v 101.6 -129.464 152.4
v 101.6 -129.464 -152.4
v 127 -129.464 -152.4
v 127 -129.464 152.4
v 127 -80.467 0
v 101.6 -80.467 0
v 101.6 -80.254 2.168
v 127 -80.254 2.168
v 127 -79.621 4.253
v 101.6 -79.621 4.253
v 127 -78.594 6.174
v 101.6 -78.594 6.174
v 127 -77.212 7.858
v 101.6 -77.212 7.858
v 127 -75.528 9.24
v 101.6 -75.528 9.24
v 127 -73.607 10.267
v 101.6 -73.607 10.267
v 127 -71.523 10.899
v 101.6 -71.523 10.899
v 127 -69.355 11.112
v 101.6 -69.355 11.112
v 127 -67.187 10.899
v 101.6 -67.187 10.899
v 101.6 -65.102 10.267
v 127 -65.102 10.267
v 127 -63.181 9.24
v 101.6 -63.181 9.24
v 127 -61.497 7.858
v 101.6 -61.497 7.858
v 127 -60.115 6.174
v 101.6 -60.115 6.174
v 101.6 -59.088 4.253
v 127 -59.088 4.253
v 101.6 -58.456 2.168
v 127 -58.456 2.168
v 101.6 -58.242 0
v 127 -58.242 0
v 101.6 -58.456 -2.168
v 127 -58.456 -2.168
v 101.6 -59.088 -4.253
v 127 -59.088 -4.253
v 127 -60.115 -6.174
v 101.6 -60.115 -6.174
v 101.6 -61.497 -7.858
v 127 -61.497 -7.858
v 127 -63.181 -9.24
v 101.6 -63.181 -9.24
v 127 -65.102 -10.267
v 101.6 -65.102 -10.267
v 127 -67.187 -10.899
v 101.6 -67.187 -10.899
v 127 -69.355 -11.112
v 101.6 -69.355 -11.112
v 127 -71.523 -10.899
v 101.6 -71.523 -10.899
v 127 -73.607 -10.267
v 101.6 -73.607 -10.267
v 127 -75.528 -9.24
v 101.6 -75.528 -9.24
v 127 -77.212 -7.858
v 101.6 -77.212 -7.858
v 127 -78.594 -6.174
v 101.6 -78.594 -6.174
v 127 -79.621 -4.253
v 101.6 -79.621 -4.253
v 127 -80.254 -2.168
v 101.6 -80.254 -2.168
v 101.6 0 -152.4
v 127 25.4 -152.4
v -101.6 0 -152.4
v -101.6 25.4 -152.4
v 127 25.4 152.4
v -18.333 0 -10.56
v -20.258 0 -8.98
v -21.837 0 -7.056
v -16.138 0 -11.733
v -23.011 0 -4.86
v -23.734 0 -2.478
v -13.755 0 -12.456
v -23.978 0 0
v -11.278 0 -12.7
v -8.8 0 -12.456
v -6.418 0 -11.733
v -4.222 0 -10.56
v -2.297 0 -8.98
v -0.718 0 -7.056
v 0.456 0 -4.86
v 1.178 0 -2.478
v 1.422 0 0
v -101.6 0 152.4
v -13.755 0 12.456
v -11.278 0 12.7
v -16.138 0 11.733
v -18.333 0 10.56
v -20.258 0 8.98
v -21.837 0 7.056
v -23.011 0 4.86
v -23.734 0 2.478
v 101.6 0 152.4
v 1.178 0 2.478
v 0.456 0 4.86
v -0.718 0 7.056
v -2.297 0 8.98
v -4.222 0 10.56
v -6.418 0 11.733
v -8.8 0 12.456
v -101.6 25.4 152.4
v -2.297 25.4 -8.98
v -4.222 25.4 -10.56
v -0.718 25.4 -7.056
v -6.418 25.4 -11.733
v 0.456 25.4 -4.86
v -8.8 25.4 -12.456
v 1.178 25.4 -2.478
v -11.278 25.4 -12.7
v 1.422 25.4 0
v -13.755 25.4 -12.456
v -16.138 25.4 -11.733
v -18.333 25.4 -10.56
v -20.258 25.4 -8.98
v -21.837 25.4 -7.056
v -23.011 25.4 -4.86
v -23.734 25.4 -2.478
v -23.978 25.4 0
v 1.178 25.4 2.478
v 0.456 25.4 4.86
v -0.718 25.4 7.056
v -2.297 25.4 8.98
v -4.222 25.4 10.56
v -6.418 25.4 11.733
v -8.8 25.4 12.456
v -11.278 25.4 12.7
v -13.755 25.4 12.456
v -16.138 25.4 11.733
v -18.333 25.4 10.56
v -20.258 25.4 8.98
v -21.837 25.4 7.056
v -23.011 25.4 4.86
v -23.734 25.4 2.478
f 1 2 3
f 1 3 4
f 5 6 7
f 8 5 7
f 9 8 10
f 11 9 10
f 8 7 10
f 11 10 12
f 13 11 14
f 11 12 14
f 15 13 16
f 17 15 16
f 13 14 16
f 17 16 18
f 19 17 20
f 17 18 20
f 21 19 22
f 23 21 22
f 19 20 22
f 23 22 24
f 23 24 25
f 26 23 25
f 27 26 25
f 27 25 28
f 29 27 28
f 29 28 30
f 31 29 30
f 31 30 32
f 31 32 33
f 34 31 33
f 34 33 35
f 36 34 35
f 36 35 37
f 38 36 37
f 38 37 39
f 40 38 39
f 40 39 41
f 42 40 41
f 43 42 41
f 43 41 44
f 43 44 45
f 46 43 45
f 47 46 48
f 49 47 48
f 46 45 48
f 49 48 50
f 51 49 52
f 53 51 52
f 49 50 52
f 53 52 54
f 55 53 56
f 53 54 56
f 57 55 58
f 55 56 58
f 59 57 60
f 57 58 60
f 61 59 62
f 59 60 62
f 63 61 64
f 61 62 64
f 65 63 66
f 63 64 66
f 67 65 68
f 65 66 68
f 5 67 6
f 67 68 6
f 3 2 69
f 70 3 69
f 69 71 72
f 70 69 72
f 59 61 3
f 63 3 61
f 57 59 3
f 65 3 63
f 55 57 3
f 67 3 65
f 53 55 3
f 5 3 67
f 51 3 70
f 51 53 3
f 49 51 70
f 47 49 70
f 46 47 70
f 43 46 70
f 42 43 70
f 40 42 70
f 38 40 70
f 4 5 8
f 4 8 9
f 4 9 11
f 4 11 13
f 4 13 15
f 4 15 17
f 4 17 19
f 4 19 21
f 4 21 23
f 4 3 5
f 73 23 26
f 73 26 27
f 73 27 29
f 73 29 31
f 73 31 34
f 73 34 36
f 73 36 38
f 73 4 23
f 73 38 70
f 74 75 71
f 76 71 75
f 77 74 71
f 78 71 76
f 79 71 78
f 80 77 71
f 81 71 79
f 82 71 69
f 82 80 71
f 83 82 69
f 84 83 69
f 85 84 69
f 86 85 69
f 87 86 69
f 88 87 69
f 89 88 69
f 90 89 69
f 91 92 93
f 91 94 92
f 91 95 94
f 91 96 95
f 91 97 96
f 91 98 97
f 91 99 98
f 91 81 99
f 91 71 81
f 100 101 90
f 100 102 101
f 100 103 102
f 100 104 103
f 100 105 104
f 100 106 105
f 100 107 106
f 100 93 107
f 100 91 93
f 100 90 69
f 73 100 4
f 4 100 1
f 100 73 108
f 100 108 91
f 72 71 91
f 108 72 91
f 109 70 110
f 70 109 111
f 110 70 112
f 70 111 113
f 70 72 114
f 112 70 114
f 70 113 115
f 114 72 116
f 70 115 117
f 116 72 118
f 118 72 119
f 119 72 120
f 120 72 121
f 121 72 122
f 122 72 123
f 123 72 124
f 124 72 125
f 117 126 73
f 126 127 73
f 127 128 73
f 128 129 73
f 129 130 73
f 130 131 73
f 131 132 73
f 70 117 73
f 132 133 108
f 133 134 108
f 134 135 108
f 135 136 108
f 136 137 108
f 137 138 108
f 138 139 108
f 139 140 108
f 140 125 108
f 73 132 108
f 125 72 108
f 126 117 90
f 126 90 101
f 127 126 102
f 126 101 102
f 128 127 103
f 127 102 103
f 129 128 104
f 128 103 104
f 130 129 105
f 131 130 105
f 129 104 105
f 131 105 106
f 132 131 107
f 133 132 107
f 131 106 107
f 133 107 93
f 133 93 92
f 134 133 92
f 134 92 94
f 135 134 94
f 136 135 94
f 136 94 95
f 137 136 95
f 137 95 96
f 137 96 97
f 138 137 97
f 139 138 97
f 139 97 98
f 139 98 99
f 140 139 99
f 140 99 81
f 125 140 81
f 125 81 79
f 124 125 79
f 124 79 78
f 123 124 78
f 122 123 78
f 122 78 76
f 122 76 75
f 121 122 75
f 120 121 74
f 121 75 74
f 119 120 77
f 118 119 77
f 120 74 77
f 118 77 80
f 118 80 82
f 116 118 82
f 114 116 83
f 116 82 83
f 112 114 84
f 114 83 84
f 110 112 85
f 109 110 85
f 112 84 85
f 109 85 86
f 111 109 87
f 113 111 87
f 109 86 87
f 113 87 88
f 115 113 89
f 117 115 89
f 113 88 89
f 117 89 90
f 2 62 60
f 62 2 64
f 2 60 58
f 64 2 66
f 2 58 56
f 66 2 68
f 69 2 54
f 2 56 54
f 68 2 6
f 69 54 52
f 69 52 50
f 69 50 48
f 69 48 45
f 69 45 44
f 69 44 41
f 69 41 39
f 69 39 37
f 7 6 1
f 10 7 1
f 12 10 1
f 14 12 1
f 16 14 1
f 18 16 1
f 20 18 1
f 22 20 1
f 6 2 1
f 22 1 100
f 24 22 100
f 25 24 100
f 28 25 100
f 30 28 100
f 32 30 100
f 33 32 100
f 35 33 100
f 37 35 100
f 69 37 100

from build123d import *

# Parameters (mm, degrees)
F0_W     = 203.2
F0_H     = 304.8
F1_DEPTH = 25.4
F2_W     = 25.4
F2_H     = 304.8
F2_W_2   = 129.4638
F3_DEPTH = 25.4
F4_R     = 12.7
F5_DEPTH = 25.401
F6_R     = 11.1125
F7_DEPTH = 25.401


with BuildPart() as f1:
    # F0 (on Front) → F1 (new body)
    with BuildSketch(Plane.XZ):
        Rectangle(F0_W, F0_H)
    extrude(amount=-F1_DEPTH)

    # F2 (on face) → F3 (join)
    with BuildSketch(Plane.YZ.offset(101.6)):
        with Locations((12.7, 0)):
            Rectangle(F2_W, F2_H)
        with Locations((-64.7319, 0)):
            Rectangle(F2_W_2, F2_H)
    extrude(amount=F3_DEPTH)

    # F4 (on face) → F5 (cut, through all)
    with BuildSketch(Plane.XZ):
        with Locations((-11.2776, 0)):
            Circle(F4_R)
    extrude(amount=-F5_DEPTH, mode=Mode.SUBTRACT)

    # F6 (on face) → F7 (cut, through all)
    with BuildSketch(Plane(origin=(101.6, 0, 0), x_dir=(0, -1, 0), z_dir=(-1, 0, 0))):
        with Locations((69.3547, 0)):
            Circle(F6_R)
    extrude(amount=-F7_DEPTH, mode=Mode.SUBTRACT)


solid = f1.part
